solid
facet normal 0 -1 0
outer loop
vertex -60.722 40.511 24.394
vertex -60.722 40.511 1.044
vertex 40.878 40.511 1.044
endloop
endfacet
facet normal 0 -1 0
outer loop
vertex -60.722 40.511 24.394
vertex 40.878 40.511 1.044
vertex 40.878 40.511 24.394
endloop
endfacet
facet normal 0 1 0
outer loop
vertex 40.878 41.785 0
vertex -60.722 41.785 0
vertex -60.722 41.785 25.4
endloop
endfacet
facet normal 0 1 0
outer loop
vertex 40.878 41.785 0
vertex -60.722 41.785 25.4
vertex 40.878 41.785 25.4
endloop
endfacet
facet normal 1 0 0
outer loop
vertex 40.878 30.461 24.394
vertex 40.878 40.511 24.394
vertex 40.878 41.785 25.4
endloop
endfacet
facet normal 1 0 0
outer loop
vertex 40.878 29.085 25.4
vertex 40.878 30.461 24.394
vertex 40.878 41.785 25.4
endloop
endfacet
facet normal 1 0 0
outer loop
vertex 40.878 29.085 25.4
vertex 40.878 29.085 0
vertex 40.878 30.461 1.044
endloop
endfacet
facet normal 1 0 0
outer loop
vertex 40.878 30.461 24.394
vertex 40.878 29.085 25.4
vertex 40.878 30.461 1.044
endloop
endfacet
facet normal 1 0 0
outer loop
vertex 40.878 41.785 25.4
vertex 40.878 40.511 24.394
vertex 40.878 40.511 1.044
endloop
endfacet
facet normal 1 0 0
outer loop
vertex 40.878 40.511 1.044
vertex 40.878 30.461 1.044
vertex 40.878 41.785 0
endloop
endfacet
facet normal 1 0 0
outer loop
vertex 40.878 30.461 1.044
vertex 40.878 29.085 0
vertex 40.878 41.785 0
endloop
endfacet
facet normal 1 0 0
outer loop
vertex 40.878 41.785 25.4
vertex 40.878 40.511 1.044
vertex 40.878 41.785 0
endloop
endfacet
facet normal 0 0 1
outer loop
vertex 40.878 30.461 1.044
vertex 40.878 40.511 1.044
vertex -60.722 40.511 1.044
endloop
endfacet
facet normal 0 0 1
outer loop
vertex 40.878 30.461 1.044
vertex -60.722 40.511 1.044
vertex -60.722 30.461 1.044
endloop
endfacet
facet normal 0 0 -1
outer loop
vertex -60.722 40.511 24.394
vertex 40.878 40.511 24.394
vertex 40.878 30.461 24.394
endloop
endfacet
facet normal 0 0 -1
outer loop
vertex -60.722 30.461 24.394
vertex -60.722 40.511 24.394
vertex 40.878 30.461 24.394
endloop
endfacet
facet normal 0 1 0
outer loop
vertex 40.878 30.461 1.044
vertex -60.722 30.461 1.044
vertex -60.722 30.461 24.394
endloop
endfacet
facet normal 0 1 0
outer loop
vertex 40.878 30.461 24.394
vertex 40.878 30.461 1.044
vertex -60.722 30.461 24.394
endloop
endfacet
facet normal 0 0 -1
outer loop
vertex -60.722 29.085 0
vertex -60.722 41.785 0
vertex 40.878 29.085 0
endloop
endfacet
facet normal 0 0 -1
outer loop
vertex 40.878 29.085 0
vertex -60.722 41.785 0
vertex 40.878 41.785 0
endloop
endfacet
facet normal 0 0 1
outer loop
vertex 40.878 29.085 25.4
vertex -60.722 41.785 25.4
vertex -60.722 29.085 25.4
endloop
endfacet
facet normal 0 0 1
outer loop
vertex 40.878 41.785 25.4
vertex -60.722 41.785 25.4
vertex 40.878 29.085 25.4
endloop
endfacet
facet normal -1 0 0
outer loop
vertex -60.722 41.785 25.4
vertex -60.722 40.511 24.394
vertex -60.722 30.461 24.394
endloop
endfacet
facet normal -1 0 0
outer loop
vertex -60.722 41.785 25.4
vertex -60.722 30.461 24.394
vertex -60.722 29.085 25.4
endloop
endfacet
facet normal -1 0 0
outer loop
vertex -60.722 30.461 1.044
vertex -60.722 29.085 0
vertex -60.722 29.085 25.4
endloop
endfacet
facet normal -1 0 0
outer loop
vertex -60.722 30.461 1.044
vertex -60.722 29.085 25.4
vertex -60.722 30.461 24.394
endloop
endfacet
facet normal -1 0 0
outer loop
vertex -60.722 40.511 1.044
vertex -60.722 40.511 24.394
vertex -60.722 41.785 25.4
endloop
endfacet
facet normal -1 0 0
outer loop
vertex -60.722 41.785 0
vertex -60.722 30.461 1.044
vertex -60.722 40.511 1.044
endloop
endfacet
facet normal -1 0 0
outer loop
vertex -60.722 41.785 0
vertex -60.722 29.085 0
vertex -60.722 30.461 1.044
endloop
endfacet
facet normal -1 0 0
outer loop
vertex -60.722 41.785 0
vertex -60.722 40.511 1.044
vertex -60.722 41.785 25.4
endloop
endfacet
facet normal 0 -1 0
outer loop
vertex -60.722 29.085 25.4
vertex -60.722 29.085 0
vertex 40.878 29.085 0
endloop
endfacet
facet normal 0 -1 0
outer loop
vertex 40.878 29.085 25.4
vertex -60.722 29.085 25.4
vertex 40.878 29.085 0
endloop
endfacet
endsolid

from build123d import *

# Parameters (mm, degrees)
F0_W          = 101.6
F0_H          = 12.7
F1_DEPTH      = 25.4
F2_W          = 10.050139
F2_H          = 23.350151
F3_DEPTH      = 127
F3_DEPTH_BACK = 127


with BuildPart() as f1:
    # F0 (on Top) → F1 (new body)
    with BuildSketch(Plane.XY):
        with Locations((-9.921525, 35.434787)):
            Rectangle(F0_W, F0_H)
    extrude(amount=F1_DEPTH)

    # F2 (on face) → F3 (cut, two sides)
    with BuildSketch(Plane(origin=(-60.721525, 0, 0), x_dir=(0, -1, 0), z_dir=(-1, 0, 0))) as f3_sk:
        with Locations((-35.486013, 12.719347)):
            Rectangle(F2_W, F2_H)
    extrude(amount=-F3_DEPTH, mode=Mode.SUBTRACT)
    extrude(f3_sk.sketch, amount=-F3_DEPTH_BACK, mode=Mode.SUBTRACT)


solid = f1.part
